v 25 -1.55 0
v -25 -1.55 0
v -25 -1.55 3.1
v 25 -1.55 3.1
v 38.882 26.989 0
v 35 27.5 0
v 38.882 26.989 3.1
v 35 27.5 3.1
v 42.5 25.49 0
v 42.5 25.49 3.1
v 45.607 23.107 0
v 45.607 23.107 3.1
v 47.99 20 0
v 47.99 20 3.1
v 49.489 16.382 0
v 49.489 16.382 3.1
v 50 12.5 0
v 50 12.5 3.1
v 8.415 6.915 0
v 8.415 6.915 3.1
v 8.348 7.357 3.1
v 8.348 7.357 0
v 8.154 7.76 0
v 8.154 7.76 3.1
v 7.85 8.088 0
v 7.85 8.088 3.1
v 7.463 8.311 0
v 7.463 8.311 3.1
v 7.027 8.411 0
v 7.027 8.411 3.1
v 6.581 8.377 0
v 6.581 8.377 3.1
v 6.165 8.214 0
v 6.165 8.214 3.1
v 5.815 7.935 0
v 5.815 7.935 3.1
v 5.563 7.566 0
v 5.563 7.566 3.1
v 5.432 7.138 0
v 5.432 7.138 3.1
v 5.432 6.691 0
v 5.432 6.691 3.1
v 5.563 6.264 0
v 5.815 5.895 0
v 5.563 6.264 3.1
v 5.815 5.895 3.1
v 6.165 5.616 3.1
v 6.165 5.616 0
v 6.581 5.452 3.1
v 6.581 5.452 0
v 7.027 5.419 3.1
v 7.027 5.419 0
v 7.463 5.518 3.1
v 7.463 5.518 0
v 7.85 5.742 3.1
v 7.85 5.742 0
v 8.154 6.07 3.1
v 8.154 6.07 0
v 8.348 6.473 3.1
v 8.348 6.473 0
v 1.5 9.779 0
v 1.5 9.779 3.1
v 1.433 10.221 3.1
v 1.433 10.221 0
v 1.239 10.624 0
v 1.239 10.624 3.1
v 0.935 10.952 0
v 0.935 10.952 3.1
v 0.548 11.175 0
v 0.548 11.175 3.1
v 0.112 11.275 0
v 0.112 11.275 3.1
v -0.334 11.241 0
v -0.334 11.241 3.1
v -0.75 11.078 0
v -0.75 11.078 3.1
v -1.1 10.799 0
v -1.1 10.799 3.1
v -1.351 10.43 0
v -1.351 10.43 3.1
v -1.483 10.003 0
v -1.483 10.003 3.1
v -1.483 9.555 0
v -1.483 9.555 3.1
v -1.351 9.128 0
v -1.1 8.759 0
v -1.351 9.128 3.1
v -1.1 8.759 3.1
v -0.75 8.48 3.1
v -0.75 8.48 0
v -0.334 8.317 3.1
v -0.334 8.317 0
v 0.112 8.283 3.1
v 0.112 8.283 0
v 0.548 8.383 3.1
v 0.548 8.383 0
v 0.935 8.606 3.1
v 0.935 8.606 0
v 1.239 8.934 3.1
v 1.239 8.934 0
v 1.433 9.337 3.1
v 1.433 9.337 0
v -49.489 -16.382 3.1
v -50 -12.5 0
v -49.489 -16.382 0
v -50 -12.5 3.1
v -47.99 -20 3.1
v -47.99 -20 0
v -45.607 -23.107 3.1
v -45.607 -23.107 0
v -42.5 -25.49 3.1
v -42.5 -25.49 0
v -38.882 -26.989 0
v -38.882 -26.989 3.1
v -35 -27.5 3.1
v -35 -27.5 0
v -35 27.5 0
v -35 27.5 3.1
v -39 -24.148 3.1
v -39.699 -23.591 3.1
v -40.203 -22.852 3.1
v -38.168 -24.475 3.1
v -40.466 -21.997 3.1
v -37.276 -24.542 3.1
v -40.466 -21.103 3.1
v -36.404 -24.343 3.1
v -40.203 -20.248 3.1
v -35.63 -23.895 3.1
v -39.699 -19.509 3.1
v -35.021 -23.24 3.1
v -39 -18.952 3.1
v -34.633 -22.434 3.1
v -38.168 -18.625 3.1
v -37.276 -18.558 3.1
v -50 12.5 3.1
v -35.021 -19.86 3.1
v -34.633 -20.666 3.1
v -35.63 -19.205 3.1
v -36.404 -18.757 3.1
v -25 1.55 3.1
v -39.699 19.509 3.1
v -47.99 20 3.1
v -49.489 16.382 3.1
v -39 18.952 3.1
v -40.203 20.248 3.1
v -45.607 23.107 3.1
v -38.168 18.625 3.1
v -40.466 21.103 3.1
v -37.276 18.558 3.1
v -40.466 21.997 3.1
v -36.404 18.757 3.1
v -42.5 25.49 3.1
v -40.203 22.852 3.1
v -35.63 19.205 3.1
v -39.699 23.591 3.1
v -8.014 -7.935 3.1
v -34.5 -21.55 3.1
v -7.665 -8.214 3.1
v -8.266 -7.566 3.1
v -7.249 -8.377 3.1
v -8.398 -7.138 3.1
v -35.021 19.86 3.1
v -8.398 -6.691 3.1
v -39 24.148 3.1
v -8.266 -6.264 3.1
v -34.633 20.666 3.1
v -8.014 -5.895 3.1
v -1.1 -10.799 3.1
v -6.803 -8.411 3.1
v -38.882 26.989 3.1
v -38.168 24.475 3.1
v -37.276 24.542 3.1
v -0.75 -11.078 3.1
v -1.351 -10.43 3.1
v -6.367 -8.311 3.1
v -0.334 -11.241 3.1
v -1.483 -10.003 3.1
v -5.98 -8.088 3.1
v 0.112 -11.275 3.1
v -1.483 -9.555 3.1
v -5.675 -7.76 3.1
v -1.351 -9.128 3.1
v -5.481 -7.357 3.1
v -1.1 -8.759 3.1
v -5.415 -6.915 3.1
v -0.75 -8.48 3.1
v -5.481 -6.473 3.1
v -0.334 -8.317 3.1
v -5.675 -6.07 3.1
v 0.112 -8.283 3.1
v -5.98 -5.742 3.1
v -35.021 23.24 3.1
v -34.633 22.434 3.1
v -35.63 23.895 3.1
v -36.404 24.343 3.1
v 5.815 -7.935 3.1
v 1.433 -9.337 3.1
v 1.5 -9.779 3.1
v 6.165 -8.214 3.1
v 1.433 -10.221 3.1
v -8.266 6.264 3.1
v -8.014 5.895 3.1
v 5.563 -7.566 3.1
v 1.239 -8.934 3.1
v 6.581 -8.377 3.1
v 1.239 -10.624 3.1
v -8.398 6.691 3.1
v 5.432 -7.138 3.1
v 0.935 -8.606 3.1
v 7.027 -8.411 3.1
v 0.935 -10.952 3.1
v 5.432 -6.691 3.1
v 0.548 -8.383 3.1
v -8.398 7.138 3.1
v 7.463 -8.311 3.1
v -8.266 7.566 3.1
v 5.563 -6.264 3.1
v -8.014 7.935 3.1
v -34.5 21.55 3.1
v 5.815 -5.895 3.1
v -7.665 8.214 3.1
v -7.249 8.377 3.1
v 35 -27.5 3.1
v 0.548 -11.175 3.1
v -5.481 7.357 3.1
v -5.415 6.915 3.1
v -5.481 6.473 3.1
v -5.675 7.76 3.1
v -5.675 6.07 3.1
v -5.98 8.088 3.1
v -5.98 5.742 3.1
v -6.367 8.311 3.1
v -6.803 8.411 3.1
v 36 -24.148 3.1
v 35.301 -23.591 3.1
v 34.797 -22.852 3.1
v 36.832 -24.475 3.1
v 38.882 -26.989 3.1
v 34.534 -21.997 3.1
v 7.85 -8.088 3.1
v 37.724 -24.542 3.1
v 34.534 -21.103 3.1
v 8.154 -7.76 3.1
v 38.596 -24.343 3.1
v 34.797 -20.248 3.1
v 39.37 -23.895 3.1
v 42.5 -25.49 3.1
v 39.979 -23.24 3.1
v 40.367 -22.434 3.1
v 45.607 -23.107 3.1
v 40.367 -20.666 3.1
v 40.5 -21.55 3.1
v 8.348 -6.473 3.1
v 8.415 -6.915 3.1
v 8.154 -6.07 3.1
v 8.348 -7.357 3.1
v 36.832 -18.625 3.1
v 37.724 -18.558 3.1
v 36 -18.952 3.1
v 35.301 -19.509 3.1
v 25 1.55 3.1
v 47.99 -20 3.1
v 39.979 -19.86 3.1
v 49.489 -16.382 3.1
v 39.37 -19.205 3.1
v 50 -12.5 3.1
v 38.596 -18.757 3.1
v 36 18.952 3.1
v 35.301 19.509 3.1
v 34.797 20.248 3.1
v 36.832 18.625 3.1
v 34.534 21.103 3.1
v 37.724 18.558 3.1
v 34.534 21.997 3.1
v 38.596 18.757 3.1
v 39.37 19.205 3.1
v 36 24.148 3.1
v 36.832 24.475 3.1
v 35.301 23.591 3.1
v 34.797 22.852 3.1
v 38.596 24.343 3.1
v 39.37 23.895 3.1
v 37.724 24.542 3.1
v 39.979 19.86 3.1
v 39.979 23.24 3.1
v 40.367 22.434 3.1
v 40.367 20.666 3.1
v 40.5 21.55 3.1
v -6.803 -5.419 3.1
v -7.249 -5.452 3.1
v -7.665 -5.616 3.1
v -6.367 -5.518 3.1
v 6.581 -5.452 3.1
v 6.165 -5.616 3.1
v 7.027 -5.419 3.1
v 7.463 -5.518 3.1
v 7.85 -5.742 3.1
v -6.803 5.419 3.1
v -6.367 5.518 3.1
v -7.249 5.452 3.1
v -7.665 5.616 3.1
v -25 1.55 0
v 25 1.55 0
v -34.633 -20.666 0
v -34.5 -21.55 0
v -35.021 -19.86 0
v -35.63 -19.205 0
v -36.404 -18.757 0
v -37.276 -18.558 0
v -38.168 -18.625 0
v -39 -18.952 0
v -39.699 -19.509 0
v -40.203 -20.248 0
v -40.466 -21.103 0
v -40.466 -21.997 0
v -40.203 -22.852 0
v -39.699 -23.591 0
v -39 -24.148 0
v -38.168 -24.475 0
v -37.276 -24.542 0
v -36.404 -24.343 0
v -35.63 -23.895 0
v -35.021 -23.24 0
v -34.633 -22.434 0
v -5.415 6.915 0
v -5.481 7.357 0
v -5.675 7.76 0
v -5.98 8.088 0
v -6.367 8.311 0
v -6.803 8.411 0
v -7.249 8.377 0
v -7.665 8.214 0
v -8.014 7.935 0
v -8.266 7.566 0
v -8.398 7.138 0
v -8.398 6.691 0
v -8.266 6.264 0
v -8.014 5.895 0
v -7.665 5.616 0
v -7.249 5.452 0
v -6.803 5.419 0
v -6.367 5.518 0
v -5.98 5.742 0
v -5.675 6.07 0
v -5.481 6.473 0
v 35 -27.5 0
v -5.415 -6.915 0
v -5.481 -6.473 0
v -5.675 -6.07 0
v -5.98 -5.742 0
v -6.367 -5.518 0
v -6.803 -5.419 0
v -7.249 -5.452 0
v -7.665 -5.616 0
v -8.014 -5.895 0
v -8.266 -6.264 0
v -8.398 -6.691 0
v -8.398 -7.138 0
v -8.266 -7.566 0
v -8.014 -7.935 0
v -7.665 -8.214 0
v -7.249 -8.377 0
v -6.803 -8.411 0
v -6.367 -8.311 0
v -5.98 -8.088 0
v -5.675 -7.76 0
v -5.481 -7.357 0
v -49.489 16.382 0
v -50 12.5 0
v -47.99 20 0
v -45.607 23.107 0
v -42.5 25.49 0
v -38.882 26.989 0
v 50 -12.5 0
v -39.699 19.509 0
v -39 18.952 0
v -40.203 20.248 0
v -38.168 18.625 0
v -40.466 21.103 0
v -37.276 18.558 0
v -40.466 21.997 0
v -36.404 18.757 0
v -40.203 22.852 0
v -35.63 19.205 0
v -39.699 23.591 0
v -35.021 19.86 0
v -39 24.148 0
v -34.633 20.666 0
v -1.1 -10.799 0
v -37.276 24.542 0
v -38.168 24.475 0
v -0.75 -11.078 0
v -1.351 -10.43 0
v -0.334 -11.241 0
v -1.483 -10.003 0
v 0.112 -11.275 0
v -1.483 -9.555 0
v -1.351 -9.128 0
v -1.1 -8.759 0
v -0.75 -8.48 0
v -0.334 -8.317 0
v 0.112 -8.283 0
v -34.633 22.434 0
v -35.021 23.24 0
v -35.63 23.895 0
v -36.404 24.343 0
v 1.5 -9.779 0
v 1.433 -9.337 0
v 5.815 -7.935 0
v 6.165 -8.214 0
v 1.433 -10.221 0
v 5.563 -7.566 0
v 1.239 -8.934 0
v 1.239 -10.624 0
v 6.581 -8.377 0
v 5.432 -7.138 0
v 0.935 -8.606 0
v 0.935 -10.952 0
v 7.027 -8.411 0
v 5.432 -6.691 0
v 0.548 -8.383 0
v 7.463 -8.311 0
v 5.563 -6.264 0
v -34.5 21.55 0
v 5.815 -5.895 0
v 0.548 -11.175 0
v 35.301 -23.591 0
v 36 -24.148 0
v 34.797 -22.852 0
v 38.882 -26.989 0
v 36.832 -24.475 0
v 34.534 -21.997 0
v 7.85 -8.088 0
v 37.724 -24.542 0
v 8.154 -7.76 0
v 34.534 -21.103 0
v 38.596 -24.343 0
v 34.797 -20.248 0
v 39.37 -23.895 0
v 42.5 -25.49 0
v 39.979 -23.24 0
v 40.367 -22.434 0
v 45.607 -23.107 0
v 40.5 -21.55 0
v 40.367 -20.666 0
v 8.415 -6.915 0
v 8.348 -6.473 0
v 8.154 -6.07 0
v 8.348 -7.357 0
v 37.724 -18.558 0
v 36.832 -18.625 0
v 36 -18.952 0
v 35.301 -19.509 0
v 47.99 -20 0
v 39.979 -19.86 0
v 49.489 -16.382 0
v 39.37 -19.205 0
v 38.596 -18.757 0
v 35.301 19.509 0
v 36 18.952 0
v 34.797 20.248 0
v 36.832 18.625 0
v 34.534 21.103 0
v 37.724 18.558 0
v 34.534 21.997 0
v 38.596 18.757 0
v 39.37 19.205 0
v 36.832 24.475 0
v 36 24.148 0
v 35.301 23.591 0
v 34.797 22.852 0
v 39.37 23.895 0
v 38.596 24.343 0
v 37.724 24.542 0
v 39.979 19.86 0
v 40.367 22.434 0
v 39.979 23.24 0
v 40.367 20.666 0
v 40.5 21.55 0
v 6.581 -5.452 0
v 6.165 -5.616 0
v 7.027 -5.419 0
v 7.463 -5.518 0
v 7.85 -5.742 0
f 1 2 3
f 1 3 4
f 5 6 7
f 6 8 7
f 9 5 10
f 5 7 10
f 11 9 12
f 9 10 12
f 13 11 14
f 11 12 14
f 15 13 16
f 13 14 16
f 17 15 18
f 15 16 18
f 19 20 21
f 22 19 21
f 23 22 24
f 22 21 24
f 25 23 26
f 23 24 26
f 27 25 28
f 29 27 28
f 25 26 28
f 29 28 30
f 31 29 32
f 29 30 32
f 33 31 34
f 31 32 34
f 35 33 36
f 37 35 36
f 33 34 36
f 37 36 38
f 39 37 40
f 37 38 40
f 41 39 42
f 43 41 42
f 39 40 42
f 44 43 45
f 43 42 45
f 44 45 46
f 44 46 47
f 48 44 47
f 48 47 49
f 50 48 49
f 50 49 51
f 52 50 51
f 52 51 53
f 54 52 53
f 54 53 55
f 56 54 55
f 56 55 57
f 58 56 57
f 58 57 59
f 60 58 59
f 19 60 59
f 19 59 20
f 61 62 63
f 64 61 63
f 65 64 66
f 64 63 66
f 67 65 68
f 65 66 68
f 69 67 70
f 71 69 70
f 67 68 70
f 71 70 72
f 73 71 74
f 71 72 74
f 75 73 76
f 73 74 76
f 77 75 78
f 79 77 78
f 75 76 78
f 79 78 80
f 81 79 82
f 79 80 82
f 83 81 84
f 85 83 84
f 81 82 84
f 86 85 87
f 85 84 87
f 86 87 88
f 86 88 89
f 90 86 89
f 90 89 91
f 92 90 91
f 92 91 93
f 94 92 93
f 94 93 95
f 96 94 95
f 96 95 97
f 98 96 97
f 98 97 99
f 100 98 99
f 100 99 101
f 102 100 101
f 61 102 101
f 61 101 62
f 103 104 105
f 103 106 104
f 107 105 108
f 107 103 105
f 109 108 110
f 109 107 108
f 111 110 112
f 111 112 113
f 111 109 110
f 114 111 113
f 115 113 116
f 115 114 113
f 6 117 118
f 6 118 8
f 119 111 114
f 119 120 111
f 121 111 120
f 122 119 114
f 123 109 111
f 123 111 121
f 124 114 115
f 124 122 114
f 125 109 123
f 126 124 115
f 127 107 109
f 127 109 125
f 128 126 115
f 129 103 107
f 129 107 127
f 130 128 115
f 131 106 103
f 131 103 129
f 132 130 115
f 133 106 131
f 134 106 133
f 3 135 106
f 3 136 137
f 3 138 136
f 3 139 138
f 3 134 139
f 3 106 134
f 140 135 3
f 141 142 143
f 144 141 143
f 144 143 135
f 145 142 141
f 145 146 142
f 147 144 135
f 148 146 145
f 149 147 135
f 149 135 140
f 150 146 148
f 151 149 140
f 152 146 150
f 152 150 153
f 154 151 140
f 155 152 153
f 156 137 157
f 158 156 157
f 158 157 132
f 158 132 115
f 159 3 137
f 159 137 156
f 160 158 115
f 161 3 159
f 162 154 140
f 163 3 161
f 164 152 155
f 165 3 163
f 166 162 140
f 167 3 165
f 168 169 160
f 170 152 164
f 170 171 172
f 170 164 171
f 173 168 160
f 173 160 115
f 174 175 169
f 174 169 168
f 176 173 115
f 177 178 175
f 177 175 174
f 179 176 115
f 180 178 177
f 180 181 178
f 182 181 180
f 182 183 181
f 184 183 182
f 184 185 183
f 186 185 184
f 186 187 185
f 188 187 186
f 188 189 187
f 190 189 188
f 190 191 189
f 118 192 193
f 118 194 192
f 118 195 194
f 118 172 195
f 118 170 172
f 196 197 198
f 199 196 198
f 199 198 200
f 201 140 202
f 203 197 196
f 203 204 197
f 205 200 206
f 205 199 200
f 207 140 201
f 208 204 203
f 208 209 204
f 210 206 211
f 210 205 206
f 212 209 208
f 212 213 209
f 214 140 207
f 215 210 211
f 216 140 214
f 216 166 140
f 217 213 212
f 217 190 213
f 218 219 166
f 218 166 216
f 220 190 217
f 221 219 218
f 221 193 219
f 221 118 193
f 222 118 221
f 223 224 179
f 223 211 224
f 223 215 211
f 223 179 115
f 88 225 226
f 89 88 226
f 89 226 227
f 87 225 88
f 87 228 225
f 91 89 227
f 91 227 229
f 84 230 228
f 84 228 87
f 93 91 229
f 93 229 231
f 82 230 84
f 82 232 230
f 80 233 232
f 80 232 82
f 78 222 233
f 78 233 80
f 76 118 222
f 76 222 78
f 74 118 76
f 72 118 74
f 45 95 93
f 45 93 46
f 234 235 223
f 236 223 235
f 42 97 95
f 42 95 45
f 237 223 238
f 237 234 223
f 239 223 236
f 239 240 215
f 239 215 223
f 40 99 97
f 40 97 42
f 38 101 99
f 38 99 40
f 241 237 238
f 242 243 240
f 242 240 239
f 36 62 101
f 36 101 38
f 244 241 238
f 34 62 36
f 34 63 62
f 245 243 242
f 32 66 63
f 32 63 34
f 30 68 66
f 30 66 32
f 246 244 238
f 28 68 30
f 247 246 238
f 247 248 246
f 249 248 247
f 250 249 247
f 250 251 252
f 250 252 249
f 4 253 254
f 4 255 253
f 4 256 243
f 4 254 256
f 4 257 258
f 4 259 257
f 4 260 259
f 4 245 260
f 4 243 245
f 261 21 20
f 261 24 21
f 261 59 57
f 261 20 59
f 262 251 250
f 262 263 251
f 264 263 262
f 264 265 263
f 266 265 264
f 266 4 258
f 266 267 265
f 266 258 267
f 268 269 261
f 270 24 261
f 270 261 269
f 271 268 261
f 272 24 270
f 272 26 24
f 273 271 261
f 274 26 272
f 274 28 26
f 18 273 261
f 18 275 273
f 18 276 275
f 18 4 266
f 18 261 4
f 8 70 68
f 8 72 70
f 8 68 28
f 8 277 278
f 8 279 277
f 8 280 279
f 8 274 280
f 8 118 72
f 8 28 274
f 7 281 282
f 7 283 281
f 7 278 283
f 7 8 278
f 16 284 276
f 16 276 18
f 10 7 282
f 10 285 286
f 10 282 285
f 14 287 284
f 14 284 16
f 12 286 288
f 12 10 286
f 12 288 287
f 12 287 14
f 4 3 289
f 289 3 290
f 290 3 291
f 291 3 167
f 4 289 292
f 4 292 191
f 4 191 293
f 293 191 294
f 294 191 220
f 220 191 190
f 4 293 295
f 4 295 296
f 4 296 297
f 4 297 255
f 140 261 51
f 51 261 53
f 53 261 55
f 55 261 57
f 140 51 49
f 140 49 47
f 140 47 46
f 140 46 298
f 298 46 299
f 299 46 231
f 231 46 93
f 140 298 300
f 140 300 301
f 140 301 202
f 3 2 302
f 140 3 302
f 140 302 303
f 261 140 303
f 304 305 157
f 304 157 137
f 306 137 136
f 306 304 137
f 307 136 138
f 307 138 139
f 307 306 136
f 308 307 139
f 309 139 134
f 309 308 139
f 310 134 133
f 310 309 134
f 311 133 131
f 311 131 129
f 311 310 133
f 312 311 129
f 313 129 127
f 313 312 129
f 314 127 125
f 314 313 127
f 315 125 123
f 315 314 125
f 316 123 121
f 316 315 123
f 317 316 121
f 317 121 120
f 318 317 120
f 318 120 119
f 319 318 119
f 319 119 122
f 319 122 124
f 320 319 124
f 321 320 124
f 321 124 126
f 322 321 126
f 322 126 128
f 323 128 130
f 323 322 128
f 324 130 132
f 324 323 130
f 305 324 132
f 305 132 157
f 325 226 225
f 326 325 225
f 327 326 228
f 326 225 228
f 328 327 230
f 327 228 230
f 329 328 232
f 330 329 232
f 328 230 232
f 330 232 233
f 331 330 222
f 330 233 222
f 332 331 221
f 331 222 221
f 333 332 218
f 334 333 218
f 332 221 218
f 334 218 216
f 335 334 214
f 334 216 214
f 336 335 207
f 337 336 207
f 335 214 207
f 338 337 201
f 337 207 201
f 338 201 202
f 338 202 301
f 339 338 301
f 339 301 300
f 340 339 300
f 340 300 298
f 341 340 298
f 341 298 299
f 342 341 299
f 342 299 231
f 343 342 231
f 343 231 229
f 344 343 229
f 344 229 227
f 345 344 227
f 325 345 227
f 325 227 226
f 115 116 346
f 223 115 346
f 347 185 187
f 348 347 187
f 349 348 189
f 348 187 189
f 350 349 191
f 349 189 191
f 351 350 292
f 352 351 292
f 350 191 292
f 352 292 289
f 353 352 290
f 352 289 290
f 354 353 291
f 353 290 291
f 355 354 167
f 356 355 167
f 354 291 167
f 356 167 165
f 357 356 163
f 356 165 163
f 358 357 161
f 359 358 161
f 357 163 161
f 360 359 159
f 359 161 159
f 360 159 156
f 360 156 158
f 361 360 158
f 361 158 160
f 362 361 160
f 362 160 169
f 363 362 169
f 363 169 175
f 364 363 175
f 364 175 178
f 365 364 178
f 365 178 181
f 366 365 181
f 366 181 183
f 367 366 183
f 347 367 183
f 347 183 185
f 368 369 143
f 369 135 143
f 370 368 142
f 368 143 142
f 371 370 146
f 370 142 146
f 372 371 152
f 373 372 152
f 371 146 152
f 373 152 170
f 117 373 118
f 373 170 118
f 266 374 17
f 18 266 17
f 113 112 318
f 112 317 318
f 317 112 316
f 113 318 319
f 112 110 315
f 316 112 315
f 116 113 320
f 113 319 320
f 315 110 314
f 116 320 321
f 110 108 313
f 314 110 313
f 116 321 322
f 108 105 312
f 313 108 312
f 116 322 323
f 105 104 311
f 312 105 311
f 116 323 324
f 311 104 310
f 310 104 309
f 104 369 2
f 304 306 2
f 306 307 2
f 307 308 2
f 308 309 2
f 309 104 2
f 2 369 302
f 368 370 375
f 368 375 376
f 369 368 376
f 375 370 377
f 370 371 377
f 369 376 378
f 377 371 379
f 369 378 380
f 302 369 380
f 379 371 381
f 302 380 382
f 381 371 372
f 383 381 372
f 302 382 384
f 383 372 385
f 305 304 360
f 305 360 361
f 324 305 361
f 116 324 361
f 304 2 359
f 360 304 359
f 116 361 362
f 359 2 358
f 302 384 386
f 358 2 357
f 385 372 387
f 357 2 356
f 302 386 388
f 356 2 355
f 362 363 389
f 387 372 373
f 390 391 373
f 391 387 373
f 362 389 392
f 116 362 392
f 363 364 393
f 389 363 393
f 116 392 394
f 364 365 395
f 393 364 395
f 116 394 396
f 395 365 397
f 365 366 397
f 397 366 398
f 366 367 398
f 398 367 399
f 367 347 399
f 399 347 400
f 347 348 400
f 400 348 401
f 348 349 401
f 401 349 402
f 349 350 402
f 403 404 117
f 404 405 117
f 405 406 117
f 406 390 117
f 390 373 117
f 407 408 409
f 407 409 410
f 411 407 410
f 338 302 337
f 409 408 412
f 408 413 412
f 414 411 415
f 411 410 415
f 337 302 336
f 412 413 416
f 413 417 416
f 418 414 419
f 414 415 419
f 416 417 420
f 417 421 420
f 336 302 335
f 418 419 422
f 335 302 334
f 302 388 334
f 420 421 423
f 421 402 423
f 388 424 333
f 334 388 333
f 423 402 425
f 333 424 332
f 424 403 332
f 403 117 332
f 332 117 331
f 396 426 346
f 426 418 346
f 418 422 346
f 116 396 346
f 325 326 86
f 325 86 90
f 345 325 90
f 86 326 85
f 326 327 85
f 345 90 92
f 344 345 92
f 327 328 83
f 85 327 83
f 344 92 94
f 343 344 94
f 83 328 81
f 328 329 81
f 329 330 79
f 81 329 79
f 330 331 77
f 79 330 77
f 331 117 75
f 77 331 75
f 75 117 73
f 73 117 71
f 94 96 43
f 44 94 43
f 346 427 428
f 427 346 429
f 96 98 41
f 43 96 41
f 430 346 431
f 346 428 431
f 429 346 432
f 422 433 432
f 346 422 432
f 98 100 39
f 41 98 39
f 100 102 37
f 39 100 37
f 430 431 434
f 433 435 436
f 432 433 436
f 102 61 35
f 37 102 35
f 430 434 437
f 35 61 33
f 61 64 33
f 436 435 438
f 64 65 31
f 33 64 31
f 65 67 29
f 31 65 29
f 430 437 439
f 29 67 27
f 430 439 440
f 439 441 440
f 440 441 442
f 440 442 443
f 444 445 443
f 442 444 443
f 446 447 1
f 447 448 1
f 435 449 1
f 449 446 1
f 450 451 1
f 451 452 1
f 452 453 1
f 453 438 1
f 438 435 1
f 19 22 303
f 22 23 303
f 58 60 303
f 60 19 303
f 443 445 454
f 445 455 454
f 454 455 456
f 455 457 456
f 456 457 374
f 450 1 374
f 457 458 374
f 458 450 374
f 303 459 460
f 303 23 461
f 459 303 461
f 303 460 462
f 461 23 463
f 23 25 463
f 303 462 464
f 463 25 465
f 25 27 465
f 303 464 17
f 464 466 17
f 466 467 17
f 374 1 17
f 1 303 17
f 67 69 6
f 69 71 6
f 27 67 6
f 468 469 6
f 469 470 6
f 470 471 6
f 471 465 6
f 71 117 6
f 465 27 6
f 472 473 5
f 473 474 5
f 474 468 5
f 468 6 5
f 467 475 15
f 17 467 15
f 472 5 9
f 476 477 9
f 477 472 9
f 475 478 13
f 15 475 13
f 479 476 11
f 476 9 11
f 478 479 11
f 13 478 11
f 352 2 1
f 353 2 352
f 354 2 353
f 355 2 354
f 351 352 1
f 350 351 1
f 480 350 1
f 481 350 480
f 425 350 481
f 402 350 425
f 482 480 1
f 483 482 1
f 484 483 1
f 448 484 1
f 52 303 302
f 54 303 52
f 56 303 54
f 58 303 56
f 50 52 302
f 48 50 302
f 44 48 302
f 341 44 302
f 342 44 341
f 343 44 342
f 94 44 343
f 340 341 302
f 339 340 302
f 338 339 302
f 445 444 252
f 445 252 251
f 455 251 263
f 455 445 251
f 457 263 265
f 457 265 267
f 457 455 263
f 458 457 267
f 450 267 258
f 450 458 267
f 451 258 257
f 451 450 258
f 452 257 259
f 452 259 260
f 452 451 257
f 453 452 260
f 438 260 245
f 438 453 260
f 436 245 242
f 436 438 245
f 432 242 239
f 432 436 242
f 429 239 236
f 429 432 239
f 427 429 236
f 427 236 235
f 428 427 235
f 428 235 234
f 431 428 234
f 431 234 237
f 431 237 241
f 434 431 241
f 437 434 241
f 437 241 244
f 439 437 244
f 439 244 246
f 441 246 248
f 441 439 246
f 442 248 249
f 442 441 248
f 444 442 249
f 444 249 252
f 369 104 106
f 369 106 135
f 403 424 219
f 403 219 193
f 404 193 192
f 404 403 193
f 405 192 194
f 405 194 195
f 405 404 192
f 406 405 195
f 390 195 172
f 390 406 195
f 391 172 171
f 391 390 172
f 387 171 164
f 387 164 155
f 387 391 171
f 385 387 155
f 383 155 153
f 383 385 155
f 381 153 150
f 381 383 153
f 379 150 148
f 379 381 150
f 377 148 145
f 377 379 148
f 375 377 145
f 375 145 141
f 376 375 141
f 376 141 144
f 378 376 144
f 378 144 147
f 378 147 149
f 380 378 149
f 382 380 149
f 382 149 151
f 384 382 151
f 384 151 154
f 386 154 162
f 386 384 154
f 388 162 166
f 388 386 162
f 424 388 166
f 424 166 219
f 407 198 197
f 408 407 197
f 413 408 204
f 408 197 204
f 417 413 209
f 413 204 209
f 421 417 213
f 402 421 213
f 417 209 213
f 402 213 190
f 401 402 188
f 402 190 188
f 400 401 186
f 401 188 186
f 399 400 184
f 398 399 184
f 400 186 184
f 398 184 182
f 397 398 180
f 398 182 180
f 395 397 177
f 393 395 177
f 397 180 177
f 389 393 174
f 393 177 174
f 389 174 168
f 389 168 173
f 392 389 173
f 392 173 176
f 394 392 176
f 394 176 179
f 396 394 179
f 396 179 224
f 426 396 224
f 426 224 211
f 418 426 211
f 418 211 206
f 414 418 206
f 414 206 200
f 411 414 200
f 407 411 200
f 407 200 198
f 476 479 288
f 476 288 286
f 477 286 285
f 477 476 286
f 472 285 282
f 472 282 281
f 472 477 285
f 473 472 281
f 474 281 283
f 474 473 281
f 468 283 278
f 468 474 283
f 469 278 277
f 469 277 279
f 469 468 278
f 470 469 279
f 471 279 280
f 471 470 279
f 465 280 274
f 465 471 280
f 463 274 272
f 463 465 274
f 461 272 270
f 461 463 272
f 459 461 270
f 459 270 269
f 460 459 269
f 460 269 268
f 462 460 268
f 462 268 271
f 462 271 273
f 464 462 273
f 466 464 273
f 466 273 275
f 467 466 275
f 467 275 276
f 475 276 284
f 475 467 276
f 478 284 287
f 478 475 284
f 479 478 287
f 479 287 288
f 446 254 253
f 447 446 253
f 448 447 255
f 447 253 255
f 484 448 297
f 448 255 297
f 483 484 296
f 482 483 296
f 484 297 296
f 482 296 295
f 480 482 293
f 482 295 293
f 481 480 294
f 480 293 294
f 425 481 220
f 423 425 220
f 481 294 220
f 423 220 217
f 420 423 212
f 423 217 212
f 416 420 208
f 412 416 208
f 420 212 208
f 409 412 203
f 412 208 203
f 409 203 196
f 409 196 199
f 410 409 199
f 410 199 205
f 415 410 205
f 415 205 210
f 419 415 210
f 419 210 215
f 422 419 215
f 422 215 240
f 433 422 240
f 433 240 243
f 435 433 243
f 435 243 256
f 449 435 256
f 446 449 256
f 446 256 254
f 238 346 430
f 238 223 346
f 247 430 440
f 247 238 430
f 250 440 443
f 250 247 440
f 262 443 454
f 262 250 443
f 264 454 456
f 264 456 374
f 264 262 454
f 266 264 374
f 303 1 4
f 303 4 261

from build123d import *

# Parameters (mm, degrees)
SKETCH1_W           = 100
SKETCH1_H           = 55
SKETCH1_R           = 3
SKETCH1_W_2         = 50
SKETCH1_H_2         = 3.1
BOSS_EXTRUDE1_DEPTH = 3.1
SKETCH2_R           = 1.5
CUT_EXTRUDE1_DEPTH  = 4.1
FILLET1_R           = 15


with BuildPart() as part:
    # Sketch1 → Boss-Extrude1 (new body)
    with BuildSketch(Plane.XY):
        Rectangle(SKETCH1_W, SKETCH1_H)
        with Locations((37.5, 21.55)):
            Circle(SKETCH1_R, mode=Mode.SUBTRACT)
        with Locations((-37.5, 21.55)):
            Circle(SKETCH1_R, mode=Mode.SUBTRACT)
        with Locations((-37.5, -21.55)):
            Circle(SKETCH1_R, mode=Mode.SUBTRACT)
        with Locations((37.5, -21.55)):
            Circle(SKETCH1_R, mode=Mode.SUBTRACT)
        Rectangle(SKETCH1_W_2, SKETCH1_H_2, mode=Mode.SUBTRACT)
    extrude(amount=BOSS_EXTRUDE1_DEPTH)

    # Sketch2 → Cut-Extrude1 (cut, through all)
    with BuildSketch(Plane.XY.offset(3.1)):
        with Locations((-6.914797213, 6.914797213)):
            Circle(SKETCH2_R)
        with Locations((0, 9.779)):
            Circle(SKETCH2_R)
        with Locations((6.914797213, 6.914797213)):
            Circle(SKETCH2_R)
        with Locations((9.779, 0)):
            Circle(SKETCH2_R)
        with Locations((6.914797213, -6.914797213)):
            Circle(SKETCH2_R)
        with Locations((0, -9.779)):
            Circle(SKETCH2_R)
        with Locations((-6.914797213, -6.914797213)):
            Circle(SKETCH2_R)
        with Locations((-9.779, 0)):
            Circle(SKETCH2_R)
    extrude(amount=-CUT_EXTRUDE1_DEPTH, mode=Mode.SUBTRACT)

    # Fillet1
    fillet1_edges = [part.edges().sort_by_distance(p)[0] for p in [
        (50, -27.5, 1.55),
        (-50, -27.5, 1.55),
        (-50, 27.5, 1.55),
        (50, 27.5, 1.55),
    ]]
    fillet(fillet1_edges, radius=FILLET1_R)


solid = part.part
